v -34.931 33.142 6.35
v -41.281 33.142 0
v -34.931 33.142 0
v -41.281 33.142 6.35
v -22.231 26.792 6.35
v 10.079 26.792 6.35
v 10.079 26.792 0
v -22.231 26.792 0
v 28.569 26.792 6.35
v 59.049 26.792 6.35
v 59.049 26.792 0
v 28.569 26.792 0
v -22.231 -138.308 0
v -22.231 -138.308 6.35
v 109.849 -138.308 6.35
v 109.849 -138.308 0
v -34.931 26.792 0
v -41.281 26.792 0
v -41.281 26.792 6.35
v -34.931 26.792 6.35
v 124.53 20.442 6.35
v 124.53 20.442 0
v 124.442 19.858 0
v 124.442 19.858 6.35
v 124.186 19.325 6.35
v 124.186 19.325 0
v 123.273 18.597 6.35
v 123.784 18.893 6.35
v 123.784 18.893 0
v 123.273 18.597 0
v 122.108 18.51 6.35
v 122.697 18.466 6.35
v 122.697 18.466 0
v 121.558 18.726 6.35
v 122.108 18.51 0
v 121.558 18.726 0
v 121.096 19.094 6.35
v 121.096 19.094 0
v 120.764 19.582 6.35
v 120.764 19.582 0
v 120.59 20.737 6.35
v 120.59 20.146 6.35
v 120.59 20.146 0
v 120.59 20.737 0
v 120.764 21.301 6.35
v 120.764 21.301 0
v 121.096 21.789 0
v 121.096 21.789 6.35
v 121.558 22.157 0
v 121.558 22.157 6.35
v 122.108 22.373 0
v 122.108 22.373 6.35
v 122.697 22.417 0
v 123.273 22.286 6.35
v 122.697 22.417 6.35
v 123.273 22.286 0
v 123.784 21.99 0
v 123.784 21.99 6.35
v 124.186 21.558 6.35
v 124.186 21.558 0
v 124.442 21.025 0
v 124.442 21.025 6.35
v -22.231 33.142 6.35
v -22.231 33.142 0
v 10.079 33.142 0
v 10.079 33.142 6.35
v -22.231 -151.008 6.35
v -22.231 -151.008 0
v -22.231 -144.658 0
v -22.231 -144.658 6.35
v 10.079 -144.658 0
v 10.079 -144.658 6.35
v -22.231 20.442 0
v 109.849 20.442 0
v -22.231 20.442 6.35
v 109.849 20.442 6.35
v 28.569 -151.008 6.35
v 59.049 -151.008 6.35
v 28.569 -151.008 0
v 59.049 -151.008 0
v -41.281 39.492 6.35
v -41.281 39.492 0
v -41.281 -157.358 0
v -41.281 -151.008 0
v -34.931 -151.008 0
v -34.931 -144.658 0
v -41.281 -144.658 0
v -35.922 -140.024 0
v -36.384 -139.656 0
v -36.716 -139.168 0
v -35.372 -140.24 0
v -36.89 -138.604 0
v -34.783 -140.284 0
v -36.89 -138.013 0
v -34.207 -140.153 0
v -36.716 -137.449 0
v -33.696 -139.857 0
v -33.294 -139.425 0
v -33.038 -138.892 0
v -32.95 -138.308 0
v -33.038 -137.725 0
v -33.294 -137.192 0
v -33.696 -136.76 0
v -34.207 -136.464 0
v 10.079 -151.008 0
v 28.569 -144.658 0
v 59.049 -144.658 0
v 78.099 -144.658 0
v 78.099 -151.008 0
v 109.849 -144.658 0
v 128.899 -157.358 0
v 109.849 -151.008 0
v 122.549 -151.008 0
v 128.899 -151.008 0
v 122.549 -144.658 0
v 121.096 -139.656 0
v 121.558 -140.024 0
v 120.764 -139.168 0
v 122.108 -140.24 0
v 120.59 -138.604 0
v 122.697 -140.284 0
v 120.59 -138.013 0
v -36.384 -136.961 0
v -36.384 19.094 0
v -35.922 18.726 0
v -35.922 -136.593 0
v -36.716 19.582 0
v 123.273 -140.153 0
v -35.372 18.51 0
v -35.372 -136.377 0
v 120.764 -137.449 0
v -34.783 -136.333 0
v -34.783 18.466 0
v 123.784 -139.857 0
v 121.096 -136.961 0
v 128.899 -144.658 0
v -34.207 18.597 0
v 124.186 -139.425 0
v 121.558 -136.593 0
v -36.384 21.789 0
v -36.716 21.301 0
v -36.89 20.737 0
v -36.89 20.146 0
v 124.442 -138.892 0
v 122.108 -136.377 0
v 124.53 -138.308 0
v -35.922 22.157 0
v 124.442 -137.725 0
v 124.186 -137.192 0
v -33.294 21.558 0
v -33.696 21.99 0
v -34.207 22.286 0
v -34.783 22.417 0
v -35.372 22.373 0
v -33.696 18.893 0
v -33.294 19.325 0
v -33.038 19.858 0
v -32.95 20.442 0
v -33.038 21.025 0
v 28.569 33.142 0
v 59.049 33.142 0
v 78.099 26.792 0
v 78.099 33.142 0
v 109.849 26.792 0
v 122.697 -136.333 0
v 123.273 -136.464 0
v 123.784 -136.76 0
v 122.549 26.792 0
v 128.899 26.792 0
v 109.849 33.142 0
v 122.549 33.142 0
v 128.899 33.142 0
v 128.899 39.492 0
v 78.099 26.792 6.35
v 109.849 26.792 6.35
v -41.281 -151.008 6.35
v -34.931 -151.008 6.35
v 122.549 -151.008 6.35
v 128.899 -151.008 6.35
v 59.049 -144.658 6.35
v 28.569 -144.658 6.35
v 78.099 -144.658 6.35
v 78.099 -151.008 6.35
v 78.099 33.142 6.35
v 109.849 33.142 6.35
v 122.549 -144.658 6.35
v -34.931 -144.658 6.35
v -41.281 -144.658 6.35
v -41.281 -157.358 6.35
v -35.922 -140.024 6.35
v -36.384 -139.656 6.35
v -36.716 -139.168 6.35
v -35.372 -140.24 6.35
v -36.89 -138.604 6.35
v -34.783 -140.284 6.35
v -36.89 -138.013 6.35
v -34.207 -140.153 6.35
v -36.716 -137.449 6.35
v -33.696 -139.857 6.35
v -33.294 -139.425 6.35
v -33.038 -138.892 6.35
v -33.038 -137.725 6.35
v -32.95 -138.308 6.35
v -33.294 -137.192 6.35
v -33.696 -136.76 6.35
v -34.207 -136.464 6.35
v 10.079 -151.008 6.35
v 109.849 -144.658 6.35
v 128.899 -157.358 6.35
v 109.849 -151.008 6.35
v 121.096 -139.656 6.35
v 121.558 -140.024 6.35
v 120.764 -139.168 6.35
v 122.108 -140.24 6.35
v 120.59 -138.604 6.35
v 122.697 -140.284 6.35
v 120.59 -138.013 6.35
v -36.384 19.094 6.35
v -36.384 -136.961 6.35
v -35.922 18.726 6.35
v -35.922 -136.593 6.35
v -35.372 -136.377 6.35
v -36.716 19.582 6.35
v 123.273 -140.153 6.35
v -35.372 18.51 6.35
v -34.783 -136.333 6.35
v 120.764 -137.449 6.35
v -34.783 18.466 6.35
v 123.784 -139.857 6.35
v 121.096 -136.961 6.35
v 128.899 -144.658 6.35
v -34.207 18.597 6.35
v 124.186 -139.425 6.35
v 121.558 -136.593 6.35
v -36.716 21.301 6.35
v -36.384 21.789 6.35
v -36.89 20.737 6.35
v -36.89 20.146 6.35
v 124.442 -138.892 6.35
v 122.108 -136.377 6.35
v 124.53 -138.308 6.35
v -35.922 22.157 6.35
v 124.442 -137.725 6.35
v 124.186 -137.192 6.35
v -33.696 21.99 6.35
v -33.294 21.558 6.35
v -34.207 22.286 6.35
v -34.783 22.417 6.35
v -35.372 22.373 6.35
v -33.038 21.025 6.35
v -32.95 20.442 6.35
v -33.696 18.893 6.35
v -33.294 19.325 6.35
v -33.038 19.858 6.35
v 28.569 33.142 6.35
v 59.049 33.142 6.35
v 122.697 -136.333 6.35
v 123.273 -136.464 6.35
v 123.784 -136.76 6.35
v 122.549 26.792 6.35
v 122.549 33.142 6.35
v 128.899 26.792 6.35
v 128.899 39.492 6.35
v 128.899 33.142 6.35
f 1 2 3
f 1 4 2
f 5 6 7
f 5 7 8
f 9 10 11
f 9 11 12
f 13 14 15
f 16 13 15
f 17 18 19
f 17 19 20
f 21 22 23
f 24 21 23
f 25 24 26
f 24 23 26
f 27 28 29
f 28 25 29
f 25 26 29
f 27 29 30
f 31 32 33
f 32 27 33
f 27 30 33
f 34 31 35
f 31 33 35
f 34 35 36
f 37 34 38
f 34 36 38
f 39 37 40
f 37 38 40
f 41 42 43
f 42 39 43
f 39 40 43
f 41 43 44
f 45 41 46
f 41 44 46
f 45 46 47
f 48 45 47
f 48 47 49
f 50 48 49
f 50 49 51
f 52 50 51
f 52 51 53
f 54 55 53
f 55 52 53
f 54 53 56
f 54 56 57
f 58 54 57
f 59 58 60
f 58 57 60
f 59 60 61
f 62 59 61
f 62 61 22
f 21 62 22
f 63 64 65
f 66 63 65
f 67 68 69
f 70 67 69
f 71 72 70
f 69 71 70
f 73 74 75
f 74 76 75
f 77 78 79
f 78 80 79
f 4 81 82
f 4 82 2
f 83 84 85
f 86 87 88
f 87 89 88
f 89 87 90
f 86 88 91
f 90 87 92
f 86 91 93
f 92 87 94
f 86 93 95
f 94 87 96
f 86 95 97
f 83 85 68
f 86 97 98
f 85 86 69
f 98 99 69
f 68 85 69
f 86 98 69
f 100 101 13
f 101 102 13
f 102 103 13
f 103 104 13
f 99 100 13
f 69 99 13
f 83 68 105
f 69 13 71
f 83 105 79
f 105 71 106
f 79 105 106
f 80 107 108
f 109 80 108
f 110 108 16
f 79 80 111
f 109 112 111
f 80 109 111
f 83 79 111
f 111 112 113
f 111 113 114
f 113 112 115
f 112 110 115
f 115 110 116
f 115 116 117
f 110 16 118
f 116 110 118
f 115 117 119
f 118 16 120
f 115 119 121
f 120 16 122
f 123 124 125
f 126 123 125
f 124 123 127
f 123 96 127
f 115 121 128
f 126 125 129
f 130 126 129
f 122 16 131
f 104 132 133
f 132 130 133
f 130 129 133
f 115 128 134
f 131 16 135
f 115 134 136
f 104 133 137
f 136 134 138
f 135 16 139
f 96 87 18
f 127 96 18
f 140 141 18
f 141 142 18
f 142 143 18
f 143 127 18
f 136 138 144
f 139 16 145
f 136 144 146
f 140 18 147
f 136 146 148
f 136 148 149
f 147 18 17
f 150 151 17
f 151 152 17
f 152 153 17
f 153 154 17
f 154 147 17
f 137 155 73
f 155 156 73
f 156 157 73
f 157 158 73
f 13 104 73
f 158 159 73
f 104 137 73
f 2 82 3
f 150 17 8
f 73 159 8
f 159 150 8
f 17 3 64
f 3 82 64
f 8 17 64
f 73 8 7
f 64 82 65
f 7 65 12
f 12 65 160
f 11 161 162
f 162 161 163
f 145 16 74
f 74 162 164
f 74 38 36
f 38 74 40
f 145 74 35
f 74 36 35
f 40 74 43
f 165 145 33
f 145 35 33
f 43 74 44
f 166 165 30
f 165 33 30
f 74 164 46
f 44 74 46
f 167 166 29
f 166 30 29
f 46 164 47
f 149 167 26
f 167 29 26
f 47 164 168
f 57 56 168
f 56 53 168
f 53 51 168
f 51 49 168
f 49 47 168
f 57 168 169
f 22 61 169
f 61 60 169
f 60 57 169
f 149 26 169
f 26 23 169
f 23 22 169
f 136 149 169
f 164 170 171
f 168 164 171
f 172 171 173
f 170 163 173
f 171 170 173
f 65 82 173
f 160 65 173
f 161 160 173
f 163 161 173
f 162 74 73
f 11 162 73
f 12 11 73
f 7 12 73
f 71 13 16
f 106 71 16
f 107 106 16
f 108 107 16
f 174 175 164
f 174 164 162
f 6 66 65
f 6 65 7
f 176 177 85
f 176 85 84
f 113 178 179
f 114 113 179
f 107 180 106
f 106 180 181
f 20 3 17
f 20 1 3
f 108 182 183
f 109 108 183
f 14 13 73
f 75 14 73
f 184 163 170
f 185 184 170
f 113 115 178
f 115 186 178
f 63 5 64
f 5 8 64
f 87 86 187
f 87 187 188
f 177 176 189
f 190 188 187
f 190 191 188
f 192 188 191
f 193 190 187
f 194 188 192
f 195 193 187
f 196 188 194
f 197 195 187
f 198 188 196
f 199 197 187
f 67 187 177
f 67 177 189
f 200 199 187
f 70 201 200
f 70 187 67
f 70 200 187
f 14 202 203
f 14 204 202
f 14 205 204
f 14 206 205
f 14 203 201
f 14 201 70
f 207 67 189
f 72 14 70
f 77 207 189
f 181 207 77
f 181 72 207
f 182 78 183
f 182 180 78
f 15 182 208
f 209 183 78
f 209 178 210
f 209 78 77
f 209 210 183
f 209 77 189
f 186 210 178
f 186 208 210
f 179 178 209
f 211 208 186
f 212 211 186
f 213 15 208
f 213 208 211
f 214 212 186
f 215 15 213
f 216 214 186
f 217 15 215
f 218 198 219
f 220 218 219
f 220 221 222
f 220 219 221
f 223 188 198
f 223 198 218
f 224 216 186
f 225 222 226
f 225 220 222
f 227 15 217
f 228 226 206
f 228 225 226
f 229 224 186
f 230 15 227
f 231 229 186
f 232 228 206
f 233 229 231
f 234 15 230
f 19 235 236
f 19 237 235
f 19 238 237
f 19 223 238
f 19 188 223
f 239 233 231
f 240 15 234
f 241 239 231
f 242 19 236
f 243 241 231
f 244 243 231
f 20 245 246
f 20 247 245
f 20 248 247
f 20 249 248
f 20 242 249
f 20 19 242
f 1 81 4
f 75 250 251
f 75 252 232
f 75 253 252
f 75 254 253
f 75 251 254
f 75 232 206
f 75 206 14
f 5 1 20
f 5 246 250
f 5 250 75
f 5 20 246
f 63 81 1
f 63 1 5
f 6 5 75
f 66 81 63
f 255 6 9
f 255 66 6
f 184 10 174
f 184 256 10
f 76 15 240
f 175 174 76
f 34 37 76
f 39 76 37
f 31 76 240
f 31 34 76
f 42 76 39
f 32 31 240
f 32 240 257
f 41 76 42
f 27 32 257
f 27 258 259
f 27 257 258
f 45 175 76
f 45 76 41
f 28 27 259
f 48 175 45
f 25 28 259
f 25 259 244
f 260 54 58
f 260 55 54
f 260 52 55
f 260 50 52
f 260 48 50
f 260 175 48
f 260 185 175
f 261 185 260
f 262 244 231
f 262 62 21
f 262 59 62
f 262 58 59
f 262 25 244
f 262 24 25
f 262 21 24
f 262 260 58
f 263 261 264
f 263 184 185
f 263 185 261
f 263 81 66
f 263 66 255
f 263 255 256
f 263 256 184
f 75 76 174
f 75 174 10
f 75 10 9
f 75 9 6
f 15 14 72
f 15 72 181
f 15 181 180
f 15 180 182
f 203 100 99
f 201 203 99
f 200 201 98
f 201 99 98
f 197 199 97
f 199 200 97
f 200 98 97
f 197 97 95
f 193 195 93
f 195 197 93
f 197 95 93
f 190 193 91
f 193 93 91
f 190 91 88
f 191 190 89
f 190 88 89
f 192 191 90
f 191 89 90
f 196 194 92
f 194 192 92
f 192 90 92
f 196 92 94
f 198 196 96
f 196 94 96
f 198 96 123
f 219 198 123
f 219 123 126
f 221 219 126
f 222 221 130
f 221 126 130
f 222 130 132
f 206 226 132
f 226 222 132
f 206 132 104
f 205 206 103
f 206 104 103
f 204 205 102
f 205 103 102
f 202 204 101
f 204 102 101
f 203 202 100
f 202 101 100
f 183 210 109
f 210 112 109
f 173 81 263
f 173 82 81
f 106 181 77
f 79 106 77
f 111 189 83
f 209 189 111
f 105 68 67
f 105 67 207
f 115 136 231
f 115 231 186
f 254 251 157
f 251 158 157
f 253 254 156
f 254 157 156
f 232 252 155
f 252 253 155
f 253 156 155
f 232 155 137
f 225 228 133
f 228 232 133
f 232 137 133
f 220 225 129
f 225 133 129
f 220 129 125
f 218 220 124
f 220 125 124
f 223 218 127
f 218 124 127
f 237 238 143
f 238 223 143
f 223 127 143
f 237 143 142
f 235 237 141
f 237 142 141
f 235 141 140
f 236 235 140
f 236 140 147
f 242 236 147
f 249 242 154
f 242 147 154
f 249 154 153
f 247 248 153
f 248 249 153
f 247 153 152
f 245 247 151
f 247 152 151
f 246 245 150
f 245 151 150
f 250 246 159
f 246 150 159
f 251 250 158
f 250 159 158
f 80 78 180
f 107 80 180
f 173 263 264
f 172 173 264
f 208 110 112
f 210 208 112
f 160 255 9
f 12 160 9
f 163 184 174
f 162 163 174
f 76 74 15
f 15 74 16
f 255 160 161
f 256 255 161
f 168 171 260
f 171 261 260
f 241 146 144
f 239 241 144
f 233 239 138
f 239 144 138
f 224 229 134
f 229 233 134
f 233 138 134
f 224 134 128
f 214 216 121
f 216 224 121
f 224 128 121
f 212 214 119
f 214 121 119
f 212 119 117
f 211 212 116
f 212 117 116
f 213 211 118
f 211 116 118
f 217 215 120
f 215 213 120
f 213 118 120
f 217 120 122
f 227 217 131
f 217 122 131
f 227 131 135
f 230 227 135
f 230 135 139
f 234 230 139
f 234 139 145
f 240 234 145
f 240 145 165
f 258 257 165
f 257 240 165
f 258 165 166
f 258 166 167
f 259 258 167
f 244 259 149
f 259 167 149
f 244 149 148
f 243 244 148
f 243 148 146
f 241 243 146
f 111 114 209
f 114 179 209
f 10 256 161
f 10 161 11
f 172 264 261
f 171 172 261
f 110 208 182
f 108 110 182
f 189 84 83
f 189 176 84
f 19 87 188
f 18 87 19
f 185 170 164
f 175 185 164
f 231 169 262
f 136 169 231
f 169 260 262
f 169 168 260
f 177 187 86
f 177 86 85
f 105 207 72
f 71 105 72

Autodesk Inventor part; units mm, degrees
ref_plane "YZ Plane" through (0, 0, 0) normal (1, 0, 0) x (0, 1, 0)
ref_plane "XZ Plane" through (0, 0, 0) normal (0, 1, 0) x (-1, 0, 0)
ref_plane "XY Plane" through (0, 0, 0) normal (0, 0, 1) x (1, 0, 0)
sketch "Sketch1" plane through (0, 0, 0) normal (0, 0, 1) x (1, 0, 0)
  line L0 (-22.2313, 26.7915) -> (109.8487, 26.7915)
  line L1 (109.8487, 26.7915) -> (109.8487, -144.6585)
  line L2 (109.8487, -144.6585) -> (-22.2313, -144.6585)
  line L3 (-22.2313, -144.6585) -> (-22.2313, 26.7915)
  line L4 (-22.2313, 26.7915) -> (-28.5813, 26.7915)
  line L5 (-28.5813, 26.7915) -> (-28.5813, 39.4915)
  line L6 (-28.5813, 39.4915) -> (116.1987, 39.4915)
  line L7 (116.1987, 39.4915) -> (116.1987, 26.7915)
  line L8 (116.1987, 26.7915) -> (128.8987, 26.7915)
  line L9 (128.8987, 26.7915) -> (128.8987, 14.0915)
  line L10 (128.8987, 14.0915) -> (116.1987, 14.0915)
  line L11 (116.1987, 14.0915) -> (116.1987, -131.9585)
  line L12 (116.1987, -131.9585) -> (128.8987, -131.9585)
  line L13 (128.8987, -131.9585) -> (128.8987, -144.6585)
  line L14 (128.8987, -144.6585) -> (116.1987, -144.6585)
  line L15 (116.1987, -144.6585) -> (116.1987, -154.1835)
  line L16 (116.1987, -154.1835) -> (-28.5813, -154.1835)
  line L17 (-28.5813, -154.1835) -> (-28.5813, -144.6585)
  line L18 (-28.5813, -144.6585) -> (-41.2813, -144.6585)
  line L19 (-41.2813, -144.6585) -> (-41.2813, -131.9585)
  line L20 (-41.2813, -131.9585) -> (-28.5813, -131.9585)
  line L21 (-28.5813, -131.9585) -> (-28.5813, 14.0915)
  line L22 (-28.5813, 14.0915) -> (-41.2813, 14.0915)
  line L23 (-41.2813, 14.0915) -> (-41.2813, 26.7915)
  line L24 (-41.2813, 26.7915) -> (-28.5813, 26.7915)
  line L25 (-22.2313, -144.6585) -> (-22.2313, -151.0085)
  line L26 (-22.2313, -151.0085) -> (15.8687, -151.0085)
  line L27 (15.8687, -151.0085) -> (15.8687, -144.6585)
  line L28 (15.8687, -144.6585) -> (22.2187, -144.6585)
  line L29 (22.2187, -144.6585) -> (22.2187, -151.0085)
  line L30 (109.8487, -144.6585) -> (109.8487, -151.0085)
  line L31 (109.8487, -151.0085) -> (71.7487, -151.0085)
  line L32 (71.7487, -151.0085) -> (71.7487, -144.6585)
  line L33 (71.7487, -144.6585) -> (65.3987, -144.6585)
  line L34 (65.3987, -144.6585) -> (65.3987, -151.0085)
  line L35 (65.3987, -151.0085) -> (22.2187, -151.0085)
  line L36 (-22.2313, 26.7915) -> (-22.2313, 33.1415)
  line L37 (-22.2313, 33.1415) -> (15.8687, 33.1415)
  line L38 (15.8687, 33.1415) -> (15.8687, 26.7915)
  line L39 (22.2187, 26.7915) -> (22.2187, 33.1415)
  line L40 (22.2187, 33.1415) -> (65.3987, 33.1415)
  line L41 (65.3987, 33.1415) -> (65.3987, 26.7915)
  line L42 (71.7487, 26.7915) -> (71.7487, 33.1415)
  line L43 (71.7487, 33.1415) -> (109.8487, 33.1415)
  line L44 (109.8487, 33.1415) -> (109.8487, 26.7915)
  circle A0 centre (-34.9313, 20.4415) radius 1.9812
  circle A1 centre (122.5487, 20.4415) radius 1.9812
  circle A2 centre (122.5487, -138.3085) radius 1.9812
  circle A3 centre (-34.9313, -138.3085) radius 1.9812
  point P0 (0, 0)
  dimension "d0" = 132.08
  dimension "d1" = 171.45
  dimension "d2" = 6.35
  dimension "d3" = 12.7
  dimension "d4" = 144.78
  dimension "d5" = 12.7
  dimension "d6" = 12.7
  dimension "d7" = 146.05
  dimension "d8" = 9.525
  dimension "d9" = 12.7
  dimension "d10" = 6.35
  dimension "d11" = 38.1
  dimension "d12" = 6.35
  dimension "d13" = 38.1
  dimension "d14" = 6.35
  dimension "d15" = 3.9624
  dimension "d16" = 3.9624
extrude "Extrusion1" add sketch "Sketch1" along normal blind 6.35
sketch "Sketch2" plane through (-28.5813, -154.1835, 0) normal (0, -1, 0) x (1, 0, 0)
  line L0 (144.78, 6.35) -> (0, 6.35) projected
  line L1 (0, 0) -> (0, 6.35) projected
  line L2 (0, 0) -> (144.78, 0) projected
  line L3 (144.78, 0) -> (144.78, 6.35) projected
  point P0 (28.5813, 0)
extrude "Extrusion2" add sketch "Sketch2" along normal blind 3.175
sketch "Sketch3" plane through (0, 0, 6.35) normal (0, 0, 1) x (1, 0, 0)
  line L0 (-28.5813, 14.0915) -> (-41.2813, 14.0915) projected
  line L1 (-28.5813, -131.9585) -> (-28.5813, 14.0915) projected
  line L2 (-41.2813, -131.9585) -> (-28.5813, -131.9585) projected
  line L3 (116.1987, -131.9585) -> (128.8987, -131.9585) projected
  line L4 (116.1987, 14.0915) -> (116.1987, -131.9585) projected
  line L5 (128.8987, 14.0915) -> (116.1987, 14.0915) projected
  line L6 (71.7487, 33.1415) -> (109.8487, 33.1415) projected
  line L7 (-41.2813, 14.0915) -> (-41.2813, -131.9585)
  line L8 (128.8987, 14.0915) -> (128.8987, -131.9585)
  point P0 (0, 0)
extrude "Extrusion3" add sketch "Sketch3" against normal blind 6.35
sketch "Sketch4" plane through (0, 0, 6.35) normal (0, 0, 1) x (1, 0, 0)
  line L0 (-28.5813, -157.3585) -> (-28.5813, -144.6585) projected
  line L1 (-28.5813, -157.3585) -> (116.1987, -157.3585) projected
  line L2 (116.1987, -144.6585) -> (116.1987, -157.3585) projected
  line L3 (109.8487, 33.1415) -> (109.8487, -151.0085) projected
  line L4 (-22.2313, -151.0085) -> (-22.2313, 33.1415) projected
  line L5 (15.8687, 26.7915) -> (22.2187, 26.7915) projected
  line L6 (71.7487, 33.1415) -> (109.8487, 33.1415) projected
  line L7 (15.8687, 26.7915) -> (-22.2313, 26.7915)
  line L8 (22.2187, 26.7915) -> (109.8487, 26.7915)
  line L9 (109.8487, 26.7915) -> (109.8487, 20.4415)
  line L10 (109.8487, 20.4415) -> (-22.2313, 20.4415)
  line L11 (-22.2313, 20.4415) -> (-22.2313, 26.7915)
  line L12 (-22.2313, -144.6585) -> (-22.2313, -138.3085)
  line L13 (-22.2313, -138.3085) -> (109.8487, -138.3085)
  line L14 (109.8487, -144.6585) -> (-22.2313, -144.6585)
  line L15 (-28.5813, -151.0085) -> (-41.2813, -151.0085)
  line L16 (-41.2813, -151.0085) -> (-41.2813, -157.3585)
  line L17 (-41.2813, -157.3585) -> (-28.5813, -157.3585)
  line L18 (116.1987, -151.0085) -> (128.8987, -151.0085)
  line L19 (128.8987, -151.0085) -> (128.8987, -157.3585)
  line L20 (128.8987, -157.3585) -> (116.1987, -157.3585)
  point P0 (0, 0)
extrude "Extrusion4" add sketch "Sketch4" against normal blind 6.35 contours L17 L16 L15 L0 | L2 L18 L19 L20 | L3 L10 L4 L7 L5 L8 | L3 L14 L4 L13
sketch "Sketch5" plane through (0, 0, 6.35) normal (0, 0, 1) x (1, 0, 0)
  line L0 (-28.5813, 26.7915) -> (-28.5813, 39.4915) projected
  line L1 (116.1987, 39.4915) -> (116.1987, 26.7915) projected
  line L2 (15.8687, 33.1415) -> (15.8687, 26.7915) projected
  line L3 (-28.5813, 39.4915) -> (-41.2813, 39.4915)
  line L4 (-41.2813, 39.4915) -> (-41.2813, 33.1415)
  line L5 (-41.2813, 33.1415) -> (-28.5813, 33.1415)
  line L6 (116.1987, 39.4915) -> (128.8987, 39.4915)
  line L7 (128.8987, 39.4915) -> (128.8987, 33.1415)
  line L8 (128.8987, 33.1415) -> (116.1987, 33.1415)
  point P0 (0, 0)
extrude "Extrusion5" add sketch "Sketch5" against normal blind 6.35
sketch "Sketch6" plane through (0, 0, 6.35) normal (0, 0, 1) x (1, 0, 0)
  line L0 (65.3987, -151.0085) -> (22.2187, -151.0085) projected
  line L1 (22.2187, -144.6585) -> (65.3987, -144.6585) projected
  line L2 (-22.2313, -144.6585) -> (15.8687, -144.6585) projected
  line L3 (109.8487, -151.0085) -> (71.7487, -151.0085) projected
  line L4 (65.3987, 26.7915) -> (22.2187, 26.7915) projected
  line L5 (109.8487, 26.7915) -> (71.7487, 26.7915) projected
  line L6 (-41.2813, 26.7915) -> (-28.5813, 26.7915) projected
  line L7 (-28.5813, -151.0085) -> (-41.2813, -151.0085) projected
  line L8 (128.8987, -151.0085) -> (116.1987, -151.0085) projected
  line L9 (116.1987, 26.7915) -> (128.8987, 26.7915) projected
  line L10 (-28.5813, 33.1415) -> (-34.9313, 33.1415)
  line L11 (-34.9313, 33.1415) -> (-34.9313, 26.7915)
  line L12 (-34.9313, 26.7915) -> (-28.5813, 26.7915)
  line L13 (-28.5813, 26.7915) -> (-28.5813, 33.1415)
  line L14 (15.8687, 33.1415) -> (10.0792, 33.1415)
  line L15 (10.0792, 33.1415) -> (10.0792, 26.7915)
  line L16 (10.0792, 26.7915) -> (15.8687, 26.7915)
  line L17 (15.8687, 26.7915) -> (15.8687, 33.1415)
  line L18 (22.2187, 33.1415) -> (28.5687, 33.1415)
  line L19 (28.5687, 33.1415) -> (28.5687, 26.7915)
  line L20 (28.5687, 26.7915) -> (22.2187, 26.7915)
  line L21 (22.2187, 26.7915) -> (22.2187, 33.1415)
  line L22 (65.3987, 33.1415) -> (59.0487, 33.1415)
  line L23 (59.0487, 33.1415) -> (59.0487, 26.7915)
  line L24 (59.0487, 26.7915) -> (65.3987, 26.7915)
  line L25 (65.3987, 26.7915) -> (65.3987, 33.1415)
  line L26 (71.7487, 33.1415) -> (78.0987, 33.1415)
  line L27 (78.0987, 33.1415) -> (78.0987, 26.7915)
  line L28 (78.0987, 26.7915) -> (71.7487, 26.7915)
  line L29 (71.7487, 26.7915) -> (71.7487, 33.1415)
  line L30 (116.1987, 33.1415) -> (122.5487, 33.1415)
  line L31 (122.5487, 33.1415) -> (122.5487, 26.7915)
  line L32 (122.5487, 26.7915) -> (116.1987, 26.7915)
  line L33 (116.1987, 26.7915) -> (116.1987, 33.1415)
  line L34 (-28.5813, -144.6585) -> (-34.9313, -144.6585)
  line L35 (-34.9313, -144.6585) -> (-34.9313, -151.0085)
  line L36 (-34.9313, -151.0085) -> (-28.5813, -151.0085)
  line L37 (-28.5813, -151.0085) -> (-28.5813, -144.6585)
  line L38 (10.0792, -144.6585) -> (28.5687, -144.6585)
  line L39 (28.5687, -144.6585) -> (28.5687, -151.0085)
  line L40 (28.5687, -151.0085) -> (10.0792, -151.0085)
  line L41 (10.0792, -151.0085) -> (10.0792, -144.6585)
  line L42 (59.0487, -144.6585) -> (78.0987, -144.6585)
  line L43 (78.0987, -144.6585) -> (78.0987, -151.0085)
  line L44 (78.0987, -151.0085) -> (59.0487, -151.0085)
  line L45 (59.0487, -151.0085) -> (59.0487, -144.6585)
  line L46 (116.1987, -144.6585) -> (122.5487, -144.6585)
  line L47 (122.5487, -144.6585) -> (122.5487, -151.0085)
  line L48 (122.5487, -151.0085) -> (116.1987, -151.0085)
  line L49 (116.1987, -151.0085) -> (116.1987, -144.6585)
  point P0 (0, 0)
  dimension "d27" = 6.35
  dimension "d28" = 6.35
  dimension "d29" = 6.35
  dimension "d30" = 6.35
  dimension "d31" = 6.35
extrude "Extrusion6" add sketch "Sketch6" against normal blind 6.35 contours L0 L45 L1 L42 L43 L3 L44 | L0 L40 L41 L2 L38 L1 L39 | L4 L21 L18 L19 | L4 L23 L22 L25 | L5 L29 L26 L27 | L11 L10 L13 L6 | L7 L35 L34 L37 | L8 L49 L46 L47 | L33 L30 L31 L9 | L17 L16 L15 L14
properties part number "top-bot connector"
